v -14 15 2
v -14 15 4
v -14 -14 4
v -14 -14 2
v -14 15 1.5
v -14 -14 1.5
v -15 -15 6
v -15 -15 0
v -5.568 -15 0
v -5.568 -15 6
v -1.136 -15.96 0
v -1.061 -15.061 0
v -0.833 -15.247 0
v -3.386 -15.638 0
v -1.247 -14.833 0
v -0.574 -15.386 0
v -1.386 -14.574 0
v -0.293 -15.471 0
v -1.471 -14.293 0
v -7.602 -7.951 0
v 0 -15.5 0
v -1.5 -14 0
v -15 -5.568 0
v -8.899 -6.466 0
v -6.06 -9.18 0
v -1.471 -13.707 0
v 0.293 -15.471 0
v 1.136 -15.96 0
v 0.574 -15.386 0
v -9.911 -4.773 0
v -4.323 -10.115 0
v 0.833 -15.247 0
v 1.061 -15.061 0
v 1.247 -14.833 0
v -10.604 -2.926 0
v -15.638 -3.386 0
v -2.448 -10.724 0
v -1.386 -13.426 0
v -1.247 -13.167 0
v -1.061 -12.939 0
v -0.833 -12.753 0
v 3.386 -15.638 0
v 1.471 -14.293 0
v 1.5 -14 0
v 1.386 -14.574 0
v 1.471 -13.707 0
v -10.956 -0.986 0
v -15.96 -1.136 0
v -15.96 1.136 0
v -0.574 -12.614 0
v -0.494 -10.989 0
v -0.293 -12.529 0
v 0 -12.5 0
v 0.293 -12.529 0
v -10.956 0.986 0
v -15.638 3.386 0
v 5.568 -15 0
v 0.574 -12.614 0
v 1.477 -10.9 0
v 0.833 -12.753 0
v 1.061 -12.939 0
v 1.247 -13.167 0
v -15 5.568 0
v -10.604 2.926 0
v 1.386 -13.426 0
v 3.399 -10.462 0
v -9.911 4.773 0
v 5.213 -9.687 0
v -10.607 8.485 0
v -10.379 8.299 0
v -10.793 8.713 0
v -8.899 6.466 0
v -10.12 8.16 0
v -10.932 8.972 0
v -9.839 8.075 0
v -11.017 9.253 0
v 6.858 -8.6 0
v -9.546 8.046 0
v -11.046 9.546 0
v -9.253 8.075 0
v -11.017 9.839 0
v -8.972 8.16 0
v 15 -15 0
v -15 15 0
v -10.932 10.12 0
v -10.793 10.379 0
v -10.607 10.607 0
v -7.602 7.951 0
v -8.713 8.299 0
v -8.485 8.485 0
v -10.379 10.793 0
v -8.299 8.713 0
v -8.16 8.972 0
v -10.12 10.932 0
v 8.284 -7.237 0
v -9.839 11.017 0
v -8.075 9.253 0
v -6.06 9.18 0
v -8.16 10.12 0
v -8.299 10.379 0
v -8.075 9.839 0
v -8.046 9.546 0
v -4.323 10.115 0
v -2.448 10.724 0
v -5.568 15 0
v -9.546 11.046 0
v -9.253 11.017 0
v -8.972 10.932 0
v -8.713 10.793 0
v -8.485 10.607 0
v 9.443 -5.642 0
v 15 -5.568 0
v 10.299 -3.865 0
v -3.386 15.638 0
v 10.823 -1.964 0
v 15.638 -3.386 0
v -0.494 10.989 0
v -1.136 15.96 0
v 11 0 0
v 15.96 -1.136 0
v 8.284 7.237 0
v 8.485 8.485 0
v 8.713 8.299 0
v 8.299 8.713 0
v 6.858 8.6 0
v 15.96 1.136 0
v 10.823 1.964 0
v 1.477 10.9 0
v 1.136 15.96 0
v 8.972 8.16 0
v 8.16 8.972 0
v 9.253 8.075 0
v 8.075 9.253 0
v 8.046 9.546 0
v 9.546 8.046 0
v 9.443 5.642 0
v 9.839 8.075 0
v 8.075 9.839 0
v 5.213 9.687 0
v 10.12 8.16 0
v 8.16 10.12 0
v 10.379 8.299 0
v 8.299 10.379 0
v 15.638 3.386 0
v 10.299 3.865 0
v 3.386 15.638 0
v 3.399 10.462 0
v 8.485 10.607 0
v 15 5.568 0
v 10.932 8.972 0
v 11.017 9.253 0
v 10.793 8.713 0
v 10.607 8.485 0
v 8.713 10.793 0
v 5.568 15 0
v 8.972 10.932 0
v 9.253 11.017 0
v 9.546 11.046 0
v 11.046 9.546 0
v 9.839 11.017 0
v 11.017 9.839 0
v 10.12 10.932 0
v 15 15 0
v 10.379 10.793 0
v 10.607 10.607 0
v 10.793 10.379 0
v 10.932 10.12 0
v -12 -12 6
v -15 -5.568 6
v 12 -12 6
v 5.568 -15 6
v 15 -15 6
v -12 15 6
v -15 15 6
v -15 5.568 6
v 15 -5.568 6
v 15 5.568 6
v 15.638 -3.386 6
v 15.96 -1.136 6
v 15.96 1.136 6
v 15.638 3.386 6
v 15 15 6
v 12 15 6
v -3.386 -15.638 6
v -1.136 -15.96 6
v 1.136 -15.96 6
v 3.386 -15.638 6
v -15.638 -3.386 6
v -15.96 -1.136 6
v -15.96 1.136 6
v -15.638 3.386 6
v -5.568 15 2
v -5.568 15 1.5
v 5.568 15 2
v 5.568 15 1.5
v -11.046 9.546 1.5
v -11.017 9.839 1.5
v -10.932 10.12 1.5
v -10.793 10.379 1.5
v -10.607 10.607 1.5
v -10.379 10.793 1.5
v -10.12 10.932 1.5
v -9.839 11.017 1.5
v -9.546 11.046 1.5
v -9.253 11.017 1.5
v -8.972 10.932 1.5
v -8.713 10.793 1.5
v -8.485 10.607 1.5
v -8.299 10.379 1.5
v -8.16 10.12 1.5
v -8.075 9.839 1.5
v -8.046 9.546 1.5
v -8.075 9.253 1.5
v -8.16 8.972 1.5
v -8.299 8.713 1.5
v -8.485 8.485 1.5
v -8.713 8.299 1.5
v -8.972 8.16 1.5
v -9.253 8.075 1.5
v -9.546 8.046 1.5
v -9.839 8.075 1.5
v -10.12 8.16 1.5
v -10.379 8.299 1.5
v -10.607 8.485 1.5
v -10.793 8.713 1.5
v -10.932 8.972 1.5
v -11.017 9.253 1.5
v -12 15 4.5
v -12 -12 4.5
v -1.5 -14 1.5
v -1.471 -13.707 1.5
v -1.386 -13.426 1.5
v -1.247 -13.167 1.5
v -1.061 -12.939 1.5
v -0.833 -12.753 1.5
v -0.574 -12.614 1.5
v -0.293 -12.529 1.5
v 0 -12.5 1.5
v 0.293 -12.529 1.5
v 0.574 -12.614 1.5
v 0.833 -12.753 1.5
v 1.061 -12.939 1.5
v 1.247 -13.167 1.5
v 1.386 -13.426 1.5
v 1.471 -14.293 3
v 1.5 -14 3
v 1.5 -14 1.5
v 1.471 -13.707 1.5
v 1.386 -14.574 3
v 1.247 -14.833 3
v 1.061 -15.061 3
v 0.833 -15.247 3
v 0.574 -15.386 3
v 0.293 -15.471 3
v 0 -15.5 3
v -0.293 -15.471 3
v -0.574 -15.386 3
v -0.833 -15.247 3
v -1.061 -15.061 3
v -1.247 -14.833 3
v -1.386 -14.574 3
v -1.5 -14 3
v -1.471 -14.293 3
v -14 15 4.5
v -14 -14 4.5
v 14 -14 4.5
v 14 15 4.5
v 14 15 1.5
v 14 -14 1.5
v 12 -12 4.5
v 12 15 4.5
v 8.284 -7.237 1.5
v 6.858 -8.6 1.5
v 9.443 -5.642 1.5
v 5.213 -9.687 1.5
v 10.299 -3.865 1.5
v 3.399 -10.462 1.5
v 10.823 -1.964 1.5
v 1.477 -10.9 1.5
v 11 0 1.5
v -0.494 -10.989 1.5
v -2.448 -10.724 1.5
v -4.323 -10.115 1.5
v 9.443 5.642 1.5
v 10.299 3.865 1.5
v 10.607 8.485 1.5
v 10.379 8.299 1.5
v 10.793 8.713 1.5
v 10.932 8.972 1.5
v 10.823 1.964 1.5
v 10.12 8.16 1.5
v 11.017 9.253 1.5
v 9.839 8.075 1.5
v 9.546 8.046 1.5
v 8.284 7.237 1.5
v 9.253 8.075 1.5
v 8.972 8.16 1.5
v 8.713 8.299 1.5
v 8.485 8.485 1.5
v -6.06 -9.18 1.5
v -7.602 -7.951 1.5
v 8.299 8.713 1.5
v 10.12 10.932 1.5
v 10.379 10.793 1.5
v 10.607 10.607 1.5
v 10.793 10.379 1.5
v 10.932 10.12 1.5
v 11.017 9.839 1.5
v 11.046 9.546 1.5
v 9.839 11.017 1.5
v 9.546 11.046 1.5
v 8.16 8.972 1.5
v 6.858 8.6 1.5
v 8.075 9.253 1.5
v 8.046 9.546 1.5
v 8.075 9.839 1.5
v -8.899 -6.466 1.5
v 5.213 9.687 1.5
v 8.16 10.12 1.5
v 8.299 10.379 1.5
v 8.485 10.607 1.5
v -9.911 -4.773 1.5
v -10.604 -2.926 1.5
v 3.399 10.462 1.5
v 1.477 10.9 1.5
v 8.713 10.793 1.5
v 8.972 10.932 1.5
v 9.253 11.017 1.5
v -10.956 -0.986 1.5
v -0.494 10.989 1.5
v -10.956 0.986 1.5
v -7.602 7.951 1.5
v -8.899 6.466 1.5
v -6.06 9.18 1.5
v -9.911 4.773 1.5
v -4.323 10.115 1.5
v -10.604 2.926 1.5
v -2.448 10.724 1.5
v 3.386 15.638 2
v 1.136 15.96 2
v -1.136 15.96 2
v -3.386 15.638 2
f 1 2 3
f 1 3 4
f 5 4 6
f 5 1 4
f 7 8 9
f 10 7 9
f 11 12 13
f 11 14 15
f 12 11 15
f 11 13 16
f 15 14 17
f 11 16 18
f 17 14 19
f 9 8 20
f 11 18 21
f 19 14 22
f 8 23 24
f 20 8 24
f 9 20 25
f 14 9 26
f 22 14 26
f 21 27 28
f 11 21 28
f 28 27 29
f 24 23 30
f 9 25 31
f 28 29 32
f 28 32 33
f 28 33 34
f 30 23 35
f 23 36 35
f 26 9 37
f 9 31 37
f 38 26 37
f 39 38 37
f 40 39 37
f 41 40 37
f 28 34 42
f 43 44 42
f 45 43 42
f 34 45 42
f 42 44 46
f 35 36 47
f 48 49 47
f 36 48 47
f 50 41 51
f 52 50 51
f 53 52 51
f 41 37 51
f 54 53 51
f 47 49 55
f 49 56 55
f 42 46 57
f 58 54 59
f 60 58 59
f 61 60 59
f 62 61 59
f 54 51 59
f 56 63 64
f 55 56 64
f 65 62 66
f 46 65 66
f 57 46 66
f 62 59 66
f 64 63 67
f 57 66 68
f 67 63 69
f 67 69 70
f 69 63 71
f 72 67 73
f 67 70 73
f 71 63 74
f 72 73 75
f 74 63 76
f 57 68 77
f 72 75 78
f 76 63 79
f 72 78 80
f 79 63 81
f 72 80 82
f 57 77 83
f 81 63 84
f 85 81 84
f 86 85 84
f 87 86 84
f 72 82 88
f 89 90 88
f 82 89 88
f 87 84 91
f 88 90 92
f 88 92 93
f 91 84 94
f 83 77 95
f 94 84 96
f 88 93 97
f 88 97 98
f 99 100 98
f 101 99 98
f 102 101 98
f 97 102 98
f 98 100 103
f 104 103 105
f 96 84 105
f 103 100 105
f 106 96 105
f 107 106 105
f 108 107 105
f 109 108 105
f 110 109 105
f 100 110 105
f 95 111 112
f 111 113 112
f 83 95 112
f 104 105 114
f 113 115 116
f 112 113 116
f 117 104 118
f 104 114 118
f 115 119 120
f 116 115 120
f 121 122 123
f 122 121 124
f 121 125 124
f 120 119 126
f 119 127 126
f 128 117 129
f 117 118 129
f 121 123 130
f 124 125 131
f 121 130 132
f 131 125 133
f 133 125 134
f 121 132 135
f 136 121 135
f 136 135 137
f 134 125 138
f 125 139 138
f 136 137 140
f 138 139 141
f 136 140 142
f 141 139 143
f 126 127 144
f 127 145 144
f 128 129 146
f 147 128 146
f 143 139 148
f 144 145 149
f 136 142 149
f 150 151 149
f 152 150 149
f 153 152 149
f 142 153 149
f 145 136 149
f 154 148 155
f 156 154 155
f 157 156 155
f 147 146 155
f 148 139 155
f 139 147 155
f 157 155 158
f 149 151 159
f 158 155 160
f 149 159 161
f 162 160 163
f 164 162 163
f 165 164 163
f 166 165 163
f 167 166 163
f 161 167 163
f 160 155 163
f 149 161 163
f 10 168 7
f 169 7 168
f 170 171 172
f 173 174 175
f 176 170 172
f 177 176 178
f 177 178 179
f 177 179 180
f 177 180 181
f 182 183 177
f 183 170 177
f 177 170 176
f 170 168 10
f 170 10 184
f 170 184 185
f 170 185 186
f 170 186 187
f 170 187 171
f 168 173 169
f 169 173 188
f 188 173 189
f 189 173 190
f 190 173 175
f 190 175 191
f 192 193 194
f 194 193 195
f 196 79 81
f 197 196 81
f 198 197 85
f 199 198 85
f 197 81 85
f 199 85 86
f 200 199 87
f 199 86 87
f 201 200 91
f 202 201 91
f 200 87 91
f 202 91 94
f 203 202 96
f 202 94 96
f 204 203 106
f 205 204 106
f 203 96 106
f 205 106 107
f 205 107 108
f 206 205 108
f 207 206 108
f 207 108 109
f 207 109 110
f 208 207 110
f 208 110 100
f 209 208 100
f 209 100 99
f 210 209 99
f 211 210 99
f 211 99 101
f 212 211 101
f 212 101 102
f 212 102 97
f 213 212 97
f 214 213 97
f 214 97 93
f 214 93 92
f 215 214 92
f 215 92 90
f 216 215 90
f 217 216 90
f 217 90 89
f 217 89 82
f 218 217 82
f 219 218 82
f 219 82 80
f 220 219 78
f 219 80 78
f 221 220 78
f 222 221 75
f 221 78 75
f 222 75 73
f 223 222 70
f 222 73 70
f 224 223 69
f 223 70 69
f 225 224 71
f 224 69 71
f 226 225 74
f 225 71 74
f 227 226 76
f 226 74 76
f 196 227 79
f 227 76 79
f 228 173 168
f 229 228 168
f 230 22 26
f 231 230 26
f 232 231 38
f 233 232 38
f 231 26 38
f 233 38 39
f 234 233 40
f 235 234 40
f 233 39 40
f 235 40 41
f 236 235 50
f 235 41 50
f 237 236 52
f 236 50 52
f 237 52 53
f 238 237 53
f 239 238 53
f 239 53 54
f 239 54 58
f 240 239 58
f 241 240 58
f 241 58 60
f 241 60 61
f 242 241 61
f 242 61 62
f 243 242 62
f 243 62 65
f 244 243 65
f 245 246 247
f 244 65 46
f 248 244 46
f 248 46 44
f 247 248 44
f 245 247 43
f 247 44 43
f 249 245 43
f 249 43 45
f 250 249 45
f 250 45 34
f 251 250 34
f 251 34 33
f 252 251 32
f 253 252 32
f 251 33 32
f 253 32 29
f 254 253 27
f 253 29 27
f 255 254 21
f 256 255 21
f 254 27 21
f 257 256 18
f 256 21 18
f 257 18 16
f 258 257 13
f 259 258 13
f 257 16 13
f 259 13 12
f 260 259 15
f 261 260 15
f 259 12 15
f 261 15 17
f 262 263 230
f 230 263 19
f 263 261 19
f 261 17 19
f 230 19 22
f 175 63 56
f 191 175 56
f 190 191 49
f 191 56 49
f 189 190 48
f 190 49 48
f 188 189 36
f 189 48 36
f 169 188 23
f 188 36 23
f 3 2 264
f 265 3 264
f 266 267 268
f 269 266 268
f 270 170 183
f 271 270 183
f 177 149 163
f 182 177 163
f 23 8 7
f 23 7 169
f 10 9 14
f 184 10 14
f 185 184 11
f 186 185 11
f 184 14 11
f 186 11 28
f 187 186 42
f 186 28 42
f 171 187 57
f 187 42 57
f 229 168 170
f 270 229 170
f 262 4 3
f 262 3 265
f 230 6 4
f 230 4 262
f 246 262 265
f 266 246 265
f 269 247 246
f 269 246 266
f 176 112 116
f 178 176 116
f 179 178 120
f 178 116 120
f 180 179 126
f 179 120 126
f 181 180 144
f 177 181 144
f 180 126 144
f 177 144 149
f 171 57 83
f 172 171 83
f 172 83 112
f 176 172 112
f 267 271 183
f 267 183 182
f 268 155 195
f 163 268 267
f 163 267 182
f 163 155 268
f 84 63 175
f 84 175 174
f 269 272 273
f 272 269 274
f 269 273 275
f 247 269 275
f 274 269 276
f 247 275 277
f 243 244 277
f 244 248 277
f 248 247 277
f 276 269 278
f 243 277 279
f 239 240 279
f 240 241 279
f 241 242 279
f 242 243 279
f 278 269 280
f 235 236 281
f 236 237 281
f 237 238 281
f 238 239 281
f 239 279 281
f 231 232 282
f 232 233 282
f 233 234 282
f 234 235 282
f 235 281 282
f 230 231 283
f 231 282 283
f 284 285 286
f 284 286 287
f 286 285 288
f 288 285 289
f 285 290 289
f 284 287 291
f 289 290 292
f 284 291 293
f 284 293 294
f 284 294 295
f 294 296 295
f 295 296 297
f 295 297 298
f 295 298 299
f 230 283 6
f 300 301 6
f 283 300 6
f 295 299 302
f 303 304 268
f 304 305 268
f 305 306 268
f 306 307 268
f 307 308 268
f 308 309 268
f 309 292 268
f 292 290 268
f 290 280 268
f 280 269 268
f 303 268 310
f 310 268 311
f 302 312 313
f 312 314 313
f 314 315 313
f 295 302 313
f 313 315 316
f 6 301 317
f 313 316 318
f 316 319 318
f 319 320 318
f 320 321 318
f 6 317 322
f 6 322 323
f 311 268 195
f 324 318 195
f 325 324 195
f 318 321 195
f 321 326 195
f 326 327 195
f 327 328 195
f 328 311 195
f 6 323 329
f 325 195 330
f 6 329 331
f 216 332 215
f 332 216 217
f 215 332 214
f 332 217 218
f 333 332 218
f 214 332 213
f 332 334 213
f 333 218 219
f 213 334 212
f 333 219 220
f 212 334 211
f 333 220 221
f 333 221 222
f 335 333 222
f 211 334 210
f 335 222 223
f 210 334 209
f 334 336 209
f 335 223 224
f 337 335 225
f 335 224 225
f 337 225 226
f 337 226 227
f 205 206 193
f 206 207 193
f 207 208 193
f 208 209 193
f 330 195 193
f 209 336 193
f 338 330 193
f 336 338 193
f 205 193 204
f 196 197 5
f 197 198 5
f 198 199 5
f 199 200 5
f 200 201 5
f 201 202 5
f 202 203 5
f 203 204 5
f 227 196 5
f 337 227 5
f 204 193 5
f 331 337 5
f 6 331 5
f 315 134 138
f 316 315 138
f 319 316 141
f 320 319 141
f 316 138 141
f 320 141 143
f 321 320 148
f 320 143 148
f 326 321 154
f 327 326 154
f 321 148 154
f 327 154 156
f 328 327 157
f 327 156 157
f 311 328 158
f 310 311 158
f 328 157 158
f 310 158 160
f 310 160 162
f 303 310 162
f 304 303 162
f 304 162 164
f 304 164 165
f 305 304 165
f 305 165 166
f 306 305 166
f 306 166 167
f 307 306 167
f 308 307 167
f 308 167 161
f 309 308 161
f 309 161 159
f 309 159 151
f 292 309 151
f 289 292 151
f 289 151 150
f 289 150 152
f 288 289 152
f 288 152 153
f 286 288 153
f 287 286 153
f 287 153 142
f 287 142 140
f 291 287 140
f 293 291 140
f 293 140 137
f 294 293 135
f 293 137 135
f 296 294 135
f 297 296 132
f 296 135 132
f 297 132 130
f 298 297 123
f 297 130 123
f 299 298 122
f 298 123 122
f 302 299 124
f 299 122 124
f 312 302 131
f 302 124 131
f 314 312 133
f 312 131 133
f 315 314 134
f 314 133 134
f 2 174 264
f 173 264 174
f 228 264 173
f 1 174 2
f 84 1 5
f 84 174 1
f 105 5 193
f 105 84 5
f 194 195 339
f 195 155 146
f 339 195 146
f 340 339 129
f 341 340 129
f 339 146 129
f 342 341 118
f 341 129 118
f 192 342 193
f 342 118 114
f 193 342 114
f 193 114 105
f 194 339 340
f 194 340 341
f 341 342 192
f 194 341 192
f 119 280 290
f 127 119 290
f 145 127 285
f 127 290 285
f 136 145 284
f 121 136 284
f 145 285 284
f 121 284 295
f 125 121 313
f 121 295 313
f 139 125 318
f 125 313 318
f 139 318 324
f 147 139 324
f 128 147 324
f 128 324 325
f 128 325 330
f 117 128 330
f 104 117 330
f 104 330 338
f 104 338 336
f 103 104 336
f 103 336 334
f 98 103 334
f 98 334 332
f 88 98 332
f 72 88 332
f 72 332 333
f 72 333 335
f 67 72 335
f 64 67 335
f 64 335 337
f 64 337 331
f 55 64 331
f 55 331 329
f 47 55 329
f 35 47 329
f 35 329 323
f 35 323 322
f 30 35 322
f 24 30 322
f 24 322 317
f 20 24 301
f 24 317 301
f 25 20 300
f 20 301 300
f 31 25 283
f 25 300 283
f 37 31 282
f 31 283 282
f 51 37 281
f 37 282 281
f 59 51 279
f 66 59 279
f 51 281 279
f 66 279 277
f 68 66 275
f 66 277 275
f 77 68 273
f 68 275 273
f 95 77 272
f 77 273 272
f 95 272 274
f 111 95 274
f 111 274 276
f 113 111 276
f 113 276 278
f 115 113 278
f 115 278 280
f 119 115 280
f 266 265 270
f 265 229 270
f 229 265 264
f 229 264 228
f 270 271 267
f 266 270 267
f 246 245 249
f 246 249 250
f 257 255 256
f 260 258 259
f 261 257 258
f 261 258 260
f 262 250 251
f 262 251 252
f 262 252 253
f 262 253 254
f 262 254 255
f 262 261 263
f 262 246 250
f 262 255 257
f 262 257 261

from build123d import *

# Parameters (mm, degrees)
SKETCH1_R           = 16
SKETCH1_W           = 30
SKETCH1_H           = 30
BOSS_EXTRUDE1_DEPTH = 6
SKETCH2_R           = 11
CUT_EXTRUDE1_DEPTH  = 10
SKETCH3_R           = 11
CUT_EXTRUDE2_DEPTH  = 4
CUT_EXTRUDE3_DEPTH  = 29
SKETCH5_W           = 8.432235637
SKETCH5_H           = 0.5
SKETCH5_W_2         = 2
CUT_EXTRUDE4_DEPTH  = 29
SKETCH6_R           = 1.5
CUT_EXTRUDE5_DEPTH  = 3


with BuildPart() as part:
    # Sketch1 → Boss-Extrude1 (new body)
    with BuildSketch(Plane.XY):
        Circle(SKETCH1_R)
        Rectangle(SKETCH1_W, SKETCH1_H)
    extrude(amount=BOSS_EXTRUDE1_DEPTH)

    # Sketch2 → Cut-Extrude1 (cut)
    with BuildSketch(Plane.XY.offset(6)):
        Circle(SKETCH2_R)
    extrude(amount=-CUT_EXTRUDE1_DEPTH, mode=Mode.SUBTRACT)

    # Sketch3 → Cut-Extrude2 (cut)
    with BuildSketch(Plane.XY.offset(6)):
        with BuildLine():
            Line((5.567764363, 15), (-5.567764363, 15))
            ThreePointArc((-5.567764363, 15), (-9.057264866, 13.189615353), (-12, 10.583005244))
            Line((-12, 10.583005244), (-12, -10.583005244))
            ThreePointArc((-12, -10.583005244), (-11.313708499, -11.313708499), (-10.583005244, -12))
            Line((-10.583005244, -12), (10.583005244, -12))
            ThreePointArc((10.583005244, -12), (11.313708499, -11.313708499), (12, -10.583005244))
            Line((12, -10.583005244), (12, 10.583005244))
            ThreePointArc((12, 10.583005244), (9.057264866, 13.189615353), (5.567764363, 15))
        make_face()
        Circle(SKETCH3_R, mode=Mode.SUBTRACT)
        with BuildLine():
            ThreePointArc((5.567764363, 15), (0, 16), (-5.567764363, 15))
            Line((-5.567764363, 15), (5.567764363, 15))
        make_face()
        with BuildLine():
            Line((-5.567764363, 15), (-12, 15))
            Line((-12, 15), (-12, 10.583005244))
            ThreePointArc((-12, 10.583005244), (-9.057264866, 13.189615353), (-5.567764363, 15))
        make_face()
        with BuildLine():
            Line((12, 15), (5.567764363, 15))
            ThreePointArc((5.567764363, 15), (9.057264866, 13.189615353), (12, 10.583005244))
            Line((12, 10.583005244), (12, 15))
        make_face()
        with BuildLine():
            Line((12, -12), (12, -10.583005244))
            ThreePointArc((12, -10.583005244), (11.313708499, -11.313708499), (10.583005244, -12))
            Line((10.583005244, -12), (12, -12))
        make_face()
        with BuildLine():
            ThreePointArc((-10.583005244, -12), (-11.313708499, -11.313708499), (-12, -10.583005244))
            Line((-12, -10.583005244), (-12, -12))
            Line((-12, -12), (-10.583005244, -12))
        make_face()
    extrude(amount=-CUT_EXTRUDE2_DEPTH, mode=Mode.SUBTRACT)

    # Sketch4 → Cut-Extrude3 (cut)
    with BuildSketch(Plane(origin=(0, 15, 0), x_dir=(1, 0, 0), z_dir=(0, 1, 0))):
        Polygon((-12, -2), (-14, -2), (-14, -4), (14, -4), (14, -2), (12, -2), align=None)
    extrude(amount=-CUT_EXTRUDE3_DEPTH, mode=Mode.SUBTRACT)

    # Sketch5 → Cut-Extrude4 (cut)
    with BuildSketch(Plane(origin=(0, 15, 0), x_dir=(1, 0, 0), z_dir=(0, 1, 0))):
        Polygon((-14, -2), (-14, -4), (14, -2), (14, -1.5), (-5.567764363, -1.5), (-5.567764363, -2), align=None)
        Polygon((14, -2), (-14, -4), (-12, -4), (-12, -4.5), (14, -4.5), align=None)
        with Locations((-9.783882182, -1.75)):
            Rectangle(SKETCH5_W, SKETCH5_H)
        with Locations((-13, -4.25)):
            Rectangle(SKETCH5_W_2, SKETCH5_H)
    extrude(amount=-CUT_EXTRUDE4_DEPTH, mode=Mode.SUBTRACT)

    # Sketch6 → Cut-Extrude5 (cut)
    with BuildSketch(Plane(origin=(0, 0, 0), x_dir=(-1, 0, 0), z_dir=(0, 0, -1))):
        with Locations((-9.545941546, 9.545941546)):
            Circle(SKETCH6_R)
        with Locations((9.545941546, 9.545941546)):
            Circle(SKETCH6_R)
        with Locations((0, -14)):
            Circle(SKETCH6_R)
    extrude(amount=-CUT_EXTRUDE5_DEPTH, mode=Mode.SUBTRACT)


solid = part.part
